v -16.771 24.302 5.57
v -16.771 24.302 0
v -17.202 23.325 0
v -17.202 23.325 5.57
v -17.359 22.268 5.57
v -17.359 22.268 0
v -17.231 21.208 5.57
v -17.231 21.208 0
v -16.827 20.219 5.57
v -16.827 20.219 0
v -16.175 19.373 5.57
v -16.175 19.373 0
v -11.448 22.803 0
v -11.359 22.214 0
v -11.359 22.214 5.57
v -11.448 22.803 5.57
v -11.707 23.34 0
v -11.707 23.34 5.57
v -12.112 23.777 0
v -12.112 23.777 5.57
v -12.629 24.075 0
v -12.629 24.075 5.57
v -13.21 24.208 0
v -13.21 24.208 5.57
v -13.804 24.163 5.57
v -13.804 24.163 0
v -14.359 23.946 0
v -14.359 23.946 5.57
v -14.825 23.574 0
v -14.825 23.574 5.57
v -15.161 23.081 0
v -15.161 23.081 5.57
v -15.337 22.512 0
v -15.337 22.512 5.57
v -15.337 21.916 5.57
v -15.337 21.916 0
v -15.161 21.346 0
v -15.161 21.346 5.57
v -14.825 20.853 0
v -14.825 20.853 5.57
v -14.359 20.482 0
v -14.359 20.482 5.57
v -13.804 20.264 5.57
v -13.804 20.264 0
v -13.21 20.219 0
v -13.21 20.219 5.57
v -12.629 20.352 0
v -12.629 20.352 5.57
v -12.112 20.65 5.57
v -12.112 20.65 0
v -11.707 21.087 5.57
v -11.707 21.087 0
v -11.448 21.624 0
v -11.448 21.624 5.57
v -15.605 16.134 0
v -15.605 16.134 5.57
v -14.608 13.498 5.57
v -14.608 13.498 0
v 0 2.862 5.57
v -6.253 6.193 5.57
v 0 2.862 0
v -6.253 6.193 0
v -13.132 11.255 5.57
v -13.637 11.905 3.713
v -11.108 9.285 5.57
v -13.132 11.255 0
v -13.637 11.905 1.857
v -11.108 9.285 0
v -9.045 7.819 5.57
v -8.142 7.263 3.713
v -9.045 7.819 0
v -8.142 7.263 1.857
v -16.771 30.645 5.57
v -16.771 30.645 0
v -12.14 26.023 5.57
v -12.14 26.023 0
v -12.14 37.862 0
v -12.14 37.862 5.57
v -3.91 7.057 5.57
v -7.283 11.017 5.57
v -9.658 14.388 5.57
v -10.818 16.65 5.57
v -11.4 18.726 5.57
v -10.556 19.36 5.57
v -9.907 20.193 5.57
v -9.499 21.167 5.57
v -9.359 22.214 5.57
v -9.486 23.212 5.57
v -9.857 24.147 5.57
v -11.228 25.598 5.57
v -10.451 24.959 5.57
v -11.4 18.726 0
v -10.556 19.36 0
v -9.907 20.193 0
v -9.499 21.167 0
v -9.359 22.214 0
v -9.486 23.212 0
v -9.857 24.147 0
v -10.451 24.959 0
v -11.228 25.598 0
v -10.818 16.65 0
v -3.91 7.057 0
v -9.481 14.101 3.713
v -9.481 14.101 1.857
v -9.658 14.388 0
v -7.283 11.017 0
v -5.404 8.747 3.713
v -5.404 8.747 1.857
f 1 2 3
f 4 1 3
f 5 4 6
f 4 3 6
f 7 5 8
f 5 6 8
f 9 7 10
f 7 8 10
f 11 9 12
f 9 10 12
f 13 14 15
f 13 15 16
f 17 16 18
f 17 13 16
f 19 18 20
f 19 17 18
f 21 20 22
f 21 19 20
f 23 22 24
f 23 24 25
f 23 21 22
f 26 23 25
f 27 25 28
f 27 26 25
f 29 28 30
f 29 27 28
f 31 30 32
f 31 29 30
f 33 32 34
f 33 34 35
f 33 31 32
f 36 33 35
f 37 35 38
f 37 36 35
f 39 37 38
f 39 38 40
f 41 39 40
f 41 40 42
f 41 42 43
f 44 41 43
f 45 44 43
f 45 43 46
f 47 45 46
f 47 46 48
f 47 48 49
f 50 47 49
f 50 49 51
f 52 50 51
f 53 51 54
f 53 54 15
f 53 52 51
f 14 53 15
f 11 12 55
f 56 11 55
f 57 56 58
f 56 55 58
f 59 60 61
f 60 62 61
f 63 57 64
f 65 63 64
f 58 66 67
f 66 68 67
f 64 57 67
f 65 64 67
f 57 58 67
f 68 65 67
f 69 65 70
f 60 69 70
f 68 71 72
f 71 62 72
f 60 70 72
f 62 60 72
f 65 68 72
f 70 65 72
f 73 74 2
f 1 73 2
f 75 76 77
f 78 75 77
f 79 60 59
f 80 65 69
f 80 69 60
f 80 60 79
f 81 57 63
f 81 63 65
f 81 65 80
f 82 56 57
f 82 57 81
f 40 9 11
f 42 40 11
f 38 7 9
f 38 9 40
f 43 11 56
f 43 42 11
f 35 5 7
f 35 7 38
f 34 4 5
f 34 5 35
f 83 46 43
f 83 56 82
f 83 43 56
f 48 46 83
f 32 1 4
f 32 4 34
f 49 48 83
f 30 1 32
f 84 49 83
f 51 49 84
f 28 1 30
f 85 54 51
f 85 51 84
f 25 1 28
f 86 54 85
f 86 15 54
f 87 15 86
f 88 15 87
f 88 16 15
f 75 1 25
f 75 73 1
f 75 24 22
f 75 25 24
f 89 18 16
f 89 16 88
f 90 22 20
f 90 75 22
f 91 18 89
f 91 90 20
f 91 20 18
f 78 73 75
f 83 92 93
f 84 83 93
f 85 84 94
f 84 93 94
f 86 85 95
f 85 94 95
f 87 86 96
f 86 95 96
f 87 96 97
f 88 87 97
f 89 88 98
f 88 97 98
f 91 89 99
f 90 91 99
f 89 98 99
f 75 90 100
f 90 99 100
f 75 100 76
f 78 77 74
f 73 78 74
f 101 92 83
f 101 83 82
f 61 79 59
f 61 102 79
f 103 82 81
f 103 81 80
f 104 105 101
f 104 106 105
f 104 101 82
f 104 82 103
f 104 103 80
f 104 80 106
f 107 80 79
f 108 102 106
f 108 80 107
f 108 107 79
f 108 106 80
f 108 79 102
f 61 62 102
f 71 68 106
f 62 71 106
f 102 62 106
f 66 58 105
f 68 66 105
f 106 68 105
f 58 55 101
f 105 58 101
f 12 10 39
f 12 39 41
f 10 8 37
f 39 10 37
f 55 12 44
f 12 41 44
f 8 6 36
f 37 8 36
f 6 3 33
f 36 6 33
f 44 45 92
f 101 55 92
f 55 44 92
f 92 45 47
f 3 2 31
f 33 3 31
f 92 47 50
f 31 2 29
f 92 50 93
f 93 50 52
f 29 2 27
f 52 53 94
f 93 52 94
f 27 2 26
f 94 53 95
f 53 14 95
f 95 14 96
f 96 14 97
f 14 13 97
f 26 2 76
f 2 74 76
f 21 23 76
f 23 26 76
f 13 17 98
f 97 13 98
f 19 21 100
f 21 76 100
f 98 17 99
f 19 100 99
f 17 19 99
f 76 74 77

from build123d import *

# Parameters (mm, degrees)
F0_R     = 2
F1_DEPTH = 5.57


with BuildPart() as f1:
    # F0 (on Top) → F1 (new body)
    with BuildSketch(Plane.XY):
        with BuildLine():
            ThreePointArc((-11.400436, 18.726019), (-9.907034, 20.19309), (-9.359215, 22.213595))
            ThreePointArc((-9.359215, 22.213595), (-10.128315, 24.571832), (-12.139857, 26.02321))
            ThreePointArc((-12.139857, 26.02321), (-14.752933, 25.962935), (-16.770909, 24.301739))
            ThreePointArc((-16.770909, 24.301739), (-17.330326, 21.73372), (-16.175298, 19.372877))
            ThreePointArc((-16.175298, 19.372877), (-13.896196, 18.249802), (-11.400436, 18.726019))
        make_face()
        with Locations((-13.359215, 22.213595)):
            Circle(F0_R, mode=Mode.SUBTRACT)
        with BuildLine():
            ThreePointArc((-16.770909, 24.301739), (-14.752933, 25.962935), (-12.139857, 26.02321))
            Line((-12.139857, 26.02321), (-12.139857, 37.861944))
            Line((-12.139857, 37.861944), (-16.770909, 30.644984))
            Line((-16.770909, 30.644984), (-16.770909, 24.301739))
        make_face()
        with BuildLine():
            add(Edge.make_bspline(
                [(-11.400436, 18.726019), (-10.838788, 14.530542), (-5.788488, 8.946827), (0, 2.861944)],
                knots=[0, 0, 0, 0, 19.535578, 19.535578, 19.535578, 19.535578], degree=3))
            ThreePointArc((-11.400436, 18.726019), (-13.896196, 18.249802), (-16.175298, 19.372877))
            add(Edge.make_bspline(
                [(-16.175298, 19.372877), (-15.218746, 9.630905), (-9.362263, 8.004596), (0, 2.861944)],
                knots=[0, 0, 0, 0, 23.113874, 23.113874, 23.113874, 23.113874], degree=3))
        make_face()
    extrude(amount=F1_DEPTH)


solid = f1.part
